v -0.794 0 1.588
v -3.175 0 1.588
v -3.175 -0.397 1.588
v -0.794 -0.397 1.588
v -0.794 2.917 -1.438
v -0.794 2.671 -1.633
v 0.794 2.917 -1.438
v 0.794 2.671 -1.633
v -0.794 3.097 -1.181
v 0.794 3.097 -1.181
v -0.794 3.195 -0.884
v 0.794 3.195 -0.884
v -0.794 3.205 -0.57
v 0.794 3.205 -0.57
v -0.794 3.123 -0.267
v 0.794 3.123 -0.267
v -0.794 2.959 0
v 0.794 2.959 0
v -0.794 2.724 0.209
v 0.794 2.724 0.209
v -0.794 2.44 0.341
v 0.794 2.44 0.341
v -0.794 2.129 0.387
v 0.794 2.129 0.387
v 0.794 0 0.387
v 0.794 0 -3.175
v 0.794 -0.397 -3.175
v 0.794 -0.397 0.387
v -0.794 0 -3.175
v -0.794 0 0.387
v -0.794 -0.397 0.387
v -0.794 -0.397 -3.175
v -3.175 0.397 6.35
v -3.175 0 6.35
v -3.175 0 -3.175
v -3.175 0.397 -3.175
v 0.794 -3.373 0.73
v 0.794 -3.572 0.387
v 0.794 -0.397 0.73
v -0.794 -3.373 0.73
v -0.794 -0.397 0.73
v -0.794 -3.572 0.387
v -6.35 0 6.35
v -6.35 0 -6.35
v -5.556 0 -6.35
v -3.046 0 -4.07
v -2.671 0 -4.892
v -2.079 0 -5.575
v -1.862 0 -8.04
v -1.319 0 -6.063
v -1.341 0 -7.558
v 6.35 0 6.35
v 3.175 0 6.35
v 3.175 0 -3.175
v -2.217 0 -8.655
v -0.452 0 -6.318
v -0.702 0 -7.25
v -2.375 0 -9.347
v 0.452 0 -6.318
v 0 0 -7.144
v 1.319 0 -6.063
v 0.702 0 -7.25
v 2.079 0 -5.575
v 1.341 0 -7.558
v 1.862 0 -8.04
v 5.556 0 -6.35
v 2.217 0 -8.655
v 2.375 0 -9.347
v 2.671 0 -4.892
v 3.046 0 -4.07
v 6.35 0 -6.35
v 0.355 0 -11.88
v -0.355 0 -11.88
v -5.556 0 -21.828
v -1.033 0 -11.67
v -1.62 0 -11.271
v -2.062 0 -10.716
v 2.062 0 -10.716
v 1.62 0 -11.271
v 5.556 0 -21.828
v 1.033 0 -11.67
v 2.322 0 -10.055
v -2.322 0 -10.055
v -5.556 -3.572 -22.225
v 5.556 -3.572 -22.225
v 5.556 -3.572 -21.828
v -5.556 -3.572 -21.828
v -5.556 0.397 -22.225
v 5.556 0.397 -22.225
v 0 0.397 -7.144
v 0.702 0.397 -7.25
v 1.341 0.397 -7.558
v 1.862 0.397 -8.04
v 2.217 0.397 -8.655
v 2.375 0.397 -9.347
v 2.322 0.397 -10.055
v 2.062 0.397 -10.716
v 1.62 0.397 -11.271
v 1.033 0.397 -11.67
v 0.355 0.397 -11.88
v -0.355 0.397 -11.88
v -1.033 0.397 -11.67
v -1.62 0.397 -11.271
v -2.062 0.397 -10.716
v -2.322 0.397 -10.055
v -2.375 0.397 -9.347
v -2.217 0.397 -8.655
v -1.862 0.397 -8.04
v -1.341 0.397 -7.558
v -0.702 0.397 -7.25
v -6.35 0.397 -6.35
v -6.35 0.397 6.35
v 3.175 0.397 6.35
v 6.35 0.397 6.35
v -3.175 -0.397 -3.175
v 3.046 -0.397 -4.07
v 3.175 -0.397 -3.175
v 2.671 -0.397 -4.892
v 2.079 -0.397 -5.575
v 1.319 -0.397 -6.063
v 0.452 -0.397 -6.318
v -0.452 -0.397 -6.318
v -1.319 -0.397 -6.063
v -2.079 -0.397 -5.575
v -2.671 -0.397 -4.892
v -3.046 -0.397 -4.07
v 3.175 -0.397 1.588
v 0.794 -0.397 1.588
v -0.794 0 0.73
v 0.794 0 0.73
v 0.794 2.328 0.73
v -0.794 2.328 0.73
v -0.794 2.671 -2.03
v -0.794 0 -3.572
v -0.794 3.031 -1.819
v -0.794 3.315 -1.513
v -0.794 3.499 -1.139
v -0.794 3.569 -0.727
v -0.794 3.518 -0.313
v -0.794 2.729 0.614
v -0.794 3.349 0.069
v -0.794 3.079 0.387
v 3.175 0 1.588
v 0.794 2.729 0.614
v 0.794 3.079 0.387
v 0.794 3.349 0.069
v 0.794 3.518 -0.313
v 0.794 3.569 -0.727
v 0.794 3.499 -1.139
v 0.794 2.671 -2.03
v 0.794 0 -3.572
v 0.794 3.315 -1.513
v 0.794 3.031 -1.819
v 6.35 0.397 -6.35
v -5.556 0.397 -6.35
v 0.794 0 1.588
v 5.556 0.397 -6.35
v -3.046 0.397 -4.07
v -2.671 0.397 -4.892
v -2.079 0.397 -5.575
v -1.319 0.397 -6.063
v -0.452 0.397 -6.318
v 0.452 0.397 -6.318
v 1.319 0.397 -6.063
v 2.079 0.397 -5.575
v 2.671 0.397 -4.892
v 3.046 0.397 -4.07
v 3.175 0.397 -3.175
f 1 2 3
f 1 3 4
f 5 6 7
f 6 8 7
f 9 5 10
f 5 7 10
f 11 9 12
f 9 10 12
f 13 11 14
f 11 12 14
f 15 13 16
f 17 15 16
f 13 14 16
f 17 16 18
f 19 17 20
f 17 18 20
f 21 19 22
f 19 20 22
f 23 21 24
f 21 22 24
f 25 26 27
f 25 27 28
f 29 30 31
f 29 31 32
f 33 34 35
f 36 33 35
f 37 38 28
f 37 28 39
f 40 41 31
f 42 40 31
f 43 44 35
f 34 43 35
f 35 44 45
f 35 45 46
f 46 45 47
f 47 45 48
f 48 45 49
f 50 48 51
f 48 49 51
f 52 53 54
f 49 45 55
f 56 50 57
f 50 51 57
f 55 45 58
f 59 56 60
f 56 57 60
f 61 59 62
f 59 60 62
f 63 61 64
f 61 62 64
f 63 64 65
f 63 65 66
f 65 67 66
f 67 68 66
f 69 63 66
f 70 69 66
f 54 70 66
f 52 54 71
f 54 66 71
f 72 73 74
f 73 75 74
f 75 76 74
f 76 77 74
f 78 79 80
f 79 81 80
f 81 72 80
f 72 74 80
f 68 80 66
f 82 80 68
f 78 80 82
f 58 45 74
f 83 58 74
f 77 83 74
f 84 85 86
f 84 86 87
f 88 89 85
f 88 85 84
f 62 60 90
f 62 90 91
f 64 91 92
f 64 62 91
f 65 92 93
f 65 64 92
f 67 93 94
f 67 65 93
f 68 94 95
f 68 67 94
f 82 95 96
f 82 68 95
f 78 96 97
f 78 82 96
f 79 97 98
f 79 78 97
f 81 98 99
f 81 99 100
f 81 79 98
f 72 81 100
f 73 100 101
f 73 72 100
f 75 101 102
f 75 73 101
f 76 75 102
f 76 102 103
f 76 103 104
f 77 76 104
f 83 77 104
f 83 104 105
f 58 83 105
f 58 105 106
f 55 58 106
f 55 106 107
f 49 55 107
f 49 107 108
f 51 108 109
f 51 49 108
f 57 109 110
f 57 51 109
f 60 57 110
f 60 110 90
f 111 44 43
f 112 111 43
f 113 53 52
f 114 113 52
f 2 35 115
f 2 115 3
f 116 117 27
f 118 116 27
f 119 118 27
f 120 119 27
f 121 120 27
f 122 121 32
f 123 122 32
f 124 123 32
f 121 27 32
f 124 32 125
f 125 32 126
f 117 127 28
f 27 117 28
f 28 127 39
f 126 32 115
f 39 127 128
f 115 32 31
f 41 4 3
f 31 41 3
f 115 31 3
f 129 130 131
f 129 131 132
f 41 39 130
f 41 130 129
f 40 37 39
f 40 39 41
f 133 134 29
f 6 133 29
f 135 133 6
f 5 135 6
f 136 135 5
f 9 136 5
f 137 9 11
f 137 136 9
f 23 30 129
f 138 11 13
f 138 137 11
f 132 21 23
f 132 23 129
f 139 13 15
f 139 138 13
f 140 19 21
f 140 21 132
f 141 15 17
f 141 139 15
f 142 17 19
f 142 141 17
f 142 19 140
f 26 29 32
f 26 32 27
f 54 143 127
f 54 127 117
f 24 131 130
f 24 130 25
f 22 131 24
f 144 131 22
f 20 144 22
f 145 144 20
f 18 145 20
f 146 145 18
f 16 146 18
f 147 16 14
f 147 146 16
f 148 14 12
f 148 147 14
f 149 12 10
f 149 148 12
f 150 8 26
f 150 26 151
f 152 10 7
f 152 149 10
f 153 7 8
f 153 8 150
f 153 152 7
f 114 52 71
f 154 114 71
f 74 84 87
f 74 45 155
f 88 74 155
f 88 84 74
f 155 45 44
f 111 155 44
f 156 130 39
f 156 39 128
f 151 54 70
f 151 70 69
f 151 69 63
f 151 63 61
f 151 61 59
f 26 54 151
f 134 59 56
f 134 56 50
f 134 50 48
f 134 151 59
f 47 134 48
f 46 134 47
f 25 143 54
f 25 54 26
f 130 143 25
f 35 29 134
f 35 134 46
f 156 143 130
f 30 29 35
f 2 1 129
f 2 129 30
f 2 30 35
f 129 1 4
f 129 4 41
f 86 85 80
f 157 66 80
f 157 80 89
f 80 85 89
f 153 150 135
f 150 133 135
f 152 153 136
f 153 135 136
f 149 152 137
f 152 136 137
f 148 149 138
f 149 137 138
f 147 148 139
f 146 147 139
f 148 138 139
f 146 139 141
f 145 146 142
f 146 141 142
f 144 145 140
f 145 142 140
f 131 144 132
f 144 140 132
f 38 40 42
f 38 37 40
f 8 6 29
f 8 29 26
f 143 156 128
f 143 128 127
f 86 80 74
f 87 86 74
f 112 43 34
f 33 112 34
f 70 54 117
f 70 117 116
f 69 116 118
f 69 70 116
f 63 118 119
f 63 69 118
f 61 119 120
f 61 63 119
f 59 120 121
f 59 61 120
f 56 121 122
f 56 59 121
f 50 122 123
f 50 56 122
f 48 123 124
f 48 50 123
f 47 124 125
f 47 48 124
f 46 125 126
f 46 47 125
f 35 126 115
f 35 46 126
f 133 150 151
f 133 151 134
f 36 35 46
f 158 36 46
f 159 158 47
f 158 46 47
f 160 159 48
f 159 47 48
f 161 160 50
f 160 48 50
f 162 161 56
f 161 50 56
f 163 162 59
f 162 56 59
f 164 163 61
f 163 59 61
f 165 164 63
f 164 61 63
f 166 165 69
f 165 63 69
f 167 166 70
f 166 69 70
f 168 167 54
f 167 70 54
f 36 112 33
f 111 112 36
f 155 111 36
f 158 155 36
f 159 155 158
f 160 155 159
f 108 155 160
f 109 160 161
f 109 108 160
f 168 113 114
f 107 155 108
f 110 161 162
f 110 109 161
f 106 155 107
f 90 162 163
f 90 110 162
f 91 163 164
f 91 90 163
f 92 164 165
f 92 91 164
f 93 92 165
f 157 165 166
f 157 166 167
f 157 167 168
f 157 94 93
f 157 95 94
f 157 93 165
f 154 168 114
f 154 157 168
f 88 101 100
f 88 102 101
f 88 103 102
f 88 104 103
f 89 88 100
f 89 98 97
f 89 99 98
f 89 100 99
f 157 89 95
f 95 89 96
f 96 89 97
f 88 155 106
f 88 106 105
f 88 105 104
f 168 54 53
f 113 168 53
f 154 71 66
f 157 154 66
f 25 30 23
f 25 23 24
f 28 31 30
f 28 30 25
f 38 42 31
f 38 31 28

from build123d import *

# Parameters (mm, degrees)
SKETCH1_R           = 2.38125
BOSS_EXTRUDE1_DEPTH = 0.396875
BOSS_EXTRUDE3_DEPTH = 0.396875
SKETCH6_W           = 1.5875
SKETCH6_H           = 0.396875
SKETCH7_W           = 11.1125
SKETCH7_H           = 3.571875
BOSS_EXTRUDE4_DEPTH = 0.396875


with BuildPart() as part:
    # Sketch1 → Boss-Extrude1 (new body)
    with BuildSketch(Plane(origin=(0, 0, 0), x_dir=(1, 0, 0), z_dir=(0, 1, 0))):
        with BuildLine():
            Line((-6.35, -6.35), (-3.175, -6.35))
            Line((-3.175, -6.35), (-3.175, 0))
            Line((-3.175, 0), (-3.175, 3.175))
            ThreePointArc((-3.175, 3.175), (0, 6.35), (3.175, 3.175))
            Line((3.175, 3.175), (3.175, 0))
            Line((3.175, 0), (3.175, -6.35))
            Line((3.175, -6.35), (6.35, -6.35))
            Line((6.35, -6.35), (6.35, 6.35))
            Line((6.35, 6.35), (5.55625, 6.35))
            Line((5.55625, 6.35), (5.55625, 22.225))
            Line((5.55625, 22.225), (-5.55625, 22.225))
            Line((-5.55625, 22.225), (-5.55625, 6.35))
            Line((-5.55625, 6.35), (-6.35, 6.35))
            Line((-6.35, 6.35), (-6.35, -6.35))
        make_face()
        with Locations(Location((0, 9.525, 0), (0, 0, 270))):
            Circle(SKETCH1_R, mode=Mode.SUBTRACT)
    extrude(amount=BOSS_EXTRUDE1_DEPTH)

    # Sketch7 → Boss-Extrude4 (add)
    with BuildSketch(Plane(origin=(0, 0, -22.225), x_dir=(-1, 0, 0), z_dir=(0, 0, -1))):
        with Locations((0, -1.7859375)):
            Rectangle(SKETCH7_W, SKETCH7_H)
    extrude(amount=-BOSS_EXTRUDE4_DEPTH)


with BuildPart() as body_2:
    # Sketch3 → Boss-Extrude3 (new body)
    with BuildSketch(Plane.XZ):
        with BuildLine():
            Line((-3.175, -3.175), (-3.175, 1.5875))
            Line((-3.175, 1.5875), (-0.79375, 1.5875))
            Line((-0.79375, 1.5875), (-0.79375, -3.175))
            Line((-0.79375, -3.175), (0.79375, -3.175))
            Line((0.79375, -3.175), (0.79375, 1.5875))
            Line((0.79375, 1.5875), (3.175, 1.5875))
            Line((3.175, 1.5875), (3.175, -3.175))
            ThreePointArc((3.175, -3.175), (0, -6.35), (-3.175, -3.175))
        make_face()
    extrude(amount=BOSS_EXTRUDE3_DEPTH)

    # Sweep1: sweep along a path in Sketch5
    with BuildLine(Plane(origin=(0, 0, 0), x_dir=(0, 0, -1), z_dir=(1, 0, 0))) as sweep1_path:
        Line((3.175, 0), (1.633092115, 2.670662798))
        ThreePointArc((1.633092115, 2.670662798), (0.415514402, 3.175), (-0.386770227, 2.129442315))
        Line((-0.386770227, 2.129442315), (-0.386770227, -3.571875))
    # Sketch6 → Sweep1 (sweep)
    with BuildSketch(Plane(origin=(0, 0, 0), x_dir=(1, 0, 0), z_dir=(0, 1, 0))):
        with Locations((0, 3.3734375)):
            Rectangle(SKETCH6_W, SKETCH6_H)
    sweep(path=sweep1_path.line)


solid = Compound([part.part, body_2.part])
